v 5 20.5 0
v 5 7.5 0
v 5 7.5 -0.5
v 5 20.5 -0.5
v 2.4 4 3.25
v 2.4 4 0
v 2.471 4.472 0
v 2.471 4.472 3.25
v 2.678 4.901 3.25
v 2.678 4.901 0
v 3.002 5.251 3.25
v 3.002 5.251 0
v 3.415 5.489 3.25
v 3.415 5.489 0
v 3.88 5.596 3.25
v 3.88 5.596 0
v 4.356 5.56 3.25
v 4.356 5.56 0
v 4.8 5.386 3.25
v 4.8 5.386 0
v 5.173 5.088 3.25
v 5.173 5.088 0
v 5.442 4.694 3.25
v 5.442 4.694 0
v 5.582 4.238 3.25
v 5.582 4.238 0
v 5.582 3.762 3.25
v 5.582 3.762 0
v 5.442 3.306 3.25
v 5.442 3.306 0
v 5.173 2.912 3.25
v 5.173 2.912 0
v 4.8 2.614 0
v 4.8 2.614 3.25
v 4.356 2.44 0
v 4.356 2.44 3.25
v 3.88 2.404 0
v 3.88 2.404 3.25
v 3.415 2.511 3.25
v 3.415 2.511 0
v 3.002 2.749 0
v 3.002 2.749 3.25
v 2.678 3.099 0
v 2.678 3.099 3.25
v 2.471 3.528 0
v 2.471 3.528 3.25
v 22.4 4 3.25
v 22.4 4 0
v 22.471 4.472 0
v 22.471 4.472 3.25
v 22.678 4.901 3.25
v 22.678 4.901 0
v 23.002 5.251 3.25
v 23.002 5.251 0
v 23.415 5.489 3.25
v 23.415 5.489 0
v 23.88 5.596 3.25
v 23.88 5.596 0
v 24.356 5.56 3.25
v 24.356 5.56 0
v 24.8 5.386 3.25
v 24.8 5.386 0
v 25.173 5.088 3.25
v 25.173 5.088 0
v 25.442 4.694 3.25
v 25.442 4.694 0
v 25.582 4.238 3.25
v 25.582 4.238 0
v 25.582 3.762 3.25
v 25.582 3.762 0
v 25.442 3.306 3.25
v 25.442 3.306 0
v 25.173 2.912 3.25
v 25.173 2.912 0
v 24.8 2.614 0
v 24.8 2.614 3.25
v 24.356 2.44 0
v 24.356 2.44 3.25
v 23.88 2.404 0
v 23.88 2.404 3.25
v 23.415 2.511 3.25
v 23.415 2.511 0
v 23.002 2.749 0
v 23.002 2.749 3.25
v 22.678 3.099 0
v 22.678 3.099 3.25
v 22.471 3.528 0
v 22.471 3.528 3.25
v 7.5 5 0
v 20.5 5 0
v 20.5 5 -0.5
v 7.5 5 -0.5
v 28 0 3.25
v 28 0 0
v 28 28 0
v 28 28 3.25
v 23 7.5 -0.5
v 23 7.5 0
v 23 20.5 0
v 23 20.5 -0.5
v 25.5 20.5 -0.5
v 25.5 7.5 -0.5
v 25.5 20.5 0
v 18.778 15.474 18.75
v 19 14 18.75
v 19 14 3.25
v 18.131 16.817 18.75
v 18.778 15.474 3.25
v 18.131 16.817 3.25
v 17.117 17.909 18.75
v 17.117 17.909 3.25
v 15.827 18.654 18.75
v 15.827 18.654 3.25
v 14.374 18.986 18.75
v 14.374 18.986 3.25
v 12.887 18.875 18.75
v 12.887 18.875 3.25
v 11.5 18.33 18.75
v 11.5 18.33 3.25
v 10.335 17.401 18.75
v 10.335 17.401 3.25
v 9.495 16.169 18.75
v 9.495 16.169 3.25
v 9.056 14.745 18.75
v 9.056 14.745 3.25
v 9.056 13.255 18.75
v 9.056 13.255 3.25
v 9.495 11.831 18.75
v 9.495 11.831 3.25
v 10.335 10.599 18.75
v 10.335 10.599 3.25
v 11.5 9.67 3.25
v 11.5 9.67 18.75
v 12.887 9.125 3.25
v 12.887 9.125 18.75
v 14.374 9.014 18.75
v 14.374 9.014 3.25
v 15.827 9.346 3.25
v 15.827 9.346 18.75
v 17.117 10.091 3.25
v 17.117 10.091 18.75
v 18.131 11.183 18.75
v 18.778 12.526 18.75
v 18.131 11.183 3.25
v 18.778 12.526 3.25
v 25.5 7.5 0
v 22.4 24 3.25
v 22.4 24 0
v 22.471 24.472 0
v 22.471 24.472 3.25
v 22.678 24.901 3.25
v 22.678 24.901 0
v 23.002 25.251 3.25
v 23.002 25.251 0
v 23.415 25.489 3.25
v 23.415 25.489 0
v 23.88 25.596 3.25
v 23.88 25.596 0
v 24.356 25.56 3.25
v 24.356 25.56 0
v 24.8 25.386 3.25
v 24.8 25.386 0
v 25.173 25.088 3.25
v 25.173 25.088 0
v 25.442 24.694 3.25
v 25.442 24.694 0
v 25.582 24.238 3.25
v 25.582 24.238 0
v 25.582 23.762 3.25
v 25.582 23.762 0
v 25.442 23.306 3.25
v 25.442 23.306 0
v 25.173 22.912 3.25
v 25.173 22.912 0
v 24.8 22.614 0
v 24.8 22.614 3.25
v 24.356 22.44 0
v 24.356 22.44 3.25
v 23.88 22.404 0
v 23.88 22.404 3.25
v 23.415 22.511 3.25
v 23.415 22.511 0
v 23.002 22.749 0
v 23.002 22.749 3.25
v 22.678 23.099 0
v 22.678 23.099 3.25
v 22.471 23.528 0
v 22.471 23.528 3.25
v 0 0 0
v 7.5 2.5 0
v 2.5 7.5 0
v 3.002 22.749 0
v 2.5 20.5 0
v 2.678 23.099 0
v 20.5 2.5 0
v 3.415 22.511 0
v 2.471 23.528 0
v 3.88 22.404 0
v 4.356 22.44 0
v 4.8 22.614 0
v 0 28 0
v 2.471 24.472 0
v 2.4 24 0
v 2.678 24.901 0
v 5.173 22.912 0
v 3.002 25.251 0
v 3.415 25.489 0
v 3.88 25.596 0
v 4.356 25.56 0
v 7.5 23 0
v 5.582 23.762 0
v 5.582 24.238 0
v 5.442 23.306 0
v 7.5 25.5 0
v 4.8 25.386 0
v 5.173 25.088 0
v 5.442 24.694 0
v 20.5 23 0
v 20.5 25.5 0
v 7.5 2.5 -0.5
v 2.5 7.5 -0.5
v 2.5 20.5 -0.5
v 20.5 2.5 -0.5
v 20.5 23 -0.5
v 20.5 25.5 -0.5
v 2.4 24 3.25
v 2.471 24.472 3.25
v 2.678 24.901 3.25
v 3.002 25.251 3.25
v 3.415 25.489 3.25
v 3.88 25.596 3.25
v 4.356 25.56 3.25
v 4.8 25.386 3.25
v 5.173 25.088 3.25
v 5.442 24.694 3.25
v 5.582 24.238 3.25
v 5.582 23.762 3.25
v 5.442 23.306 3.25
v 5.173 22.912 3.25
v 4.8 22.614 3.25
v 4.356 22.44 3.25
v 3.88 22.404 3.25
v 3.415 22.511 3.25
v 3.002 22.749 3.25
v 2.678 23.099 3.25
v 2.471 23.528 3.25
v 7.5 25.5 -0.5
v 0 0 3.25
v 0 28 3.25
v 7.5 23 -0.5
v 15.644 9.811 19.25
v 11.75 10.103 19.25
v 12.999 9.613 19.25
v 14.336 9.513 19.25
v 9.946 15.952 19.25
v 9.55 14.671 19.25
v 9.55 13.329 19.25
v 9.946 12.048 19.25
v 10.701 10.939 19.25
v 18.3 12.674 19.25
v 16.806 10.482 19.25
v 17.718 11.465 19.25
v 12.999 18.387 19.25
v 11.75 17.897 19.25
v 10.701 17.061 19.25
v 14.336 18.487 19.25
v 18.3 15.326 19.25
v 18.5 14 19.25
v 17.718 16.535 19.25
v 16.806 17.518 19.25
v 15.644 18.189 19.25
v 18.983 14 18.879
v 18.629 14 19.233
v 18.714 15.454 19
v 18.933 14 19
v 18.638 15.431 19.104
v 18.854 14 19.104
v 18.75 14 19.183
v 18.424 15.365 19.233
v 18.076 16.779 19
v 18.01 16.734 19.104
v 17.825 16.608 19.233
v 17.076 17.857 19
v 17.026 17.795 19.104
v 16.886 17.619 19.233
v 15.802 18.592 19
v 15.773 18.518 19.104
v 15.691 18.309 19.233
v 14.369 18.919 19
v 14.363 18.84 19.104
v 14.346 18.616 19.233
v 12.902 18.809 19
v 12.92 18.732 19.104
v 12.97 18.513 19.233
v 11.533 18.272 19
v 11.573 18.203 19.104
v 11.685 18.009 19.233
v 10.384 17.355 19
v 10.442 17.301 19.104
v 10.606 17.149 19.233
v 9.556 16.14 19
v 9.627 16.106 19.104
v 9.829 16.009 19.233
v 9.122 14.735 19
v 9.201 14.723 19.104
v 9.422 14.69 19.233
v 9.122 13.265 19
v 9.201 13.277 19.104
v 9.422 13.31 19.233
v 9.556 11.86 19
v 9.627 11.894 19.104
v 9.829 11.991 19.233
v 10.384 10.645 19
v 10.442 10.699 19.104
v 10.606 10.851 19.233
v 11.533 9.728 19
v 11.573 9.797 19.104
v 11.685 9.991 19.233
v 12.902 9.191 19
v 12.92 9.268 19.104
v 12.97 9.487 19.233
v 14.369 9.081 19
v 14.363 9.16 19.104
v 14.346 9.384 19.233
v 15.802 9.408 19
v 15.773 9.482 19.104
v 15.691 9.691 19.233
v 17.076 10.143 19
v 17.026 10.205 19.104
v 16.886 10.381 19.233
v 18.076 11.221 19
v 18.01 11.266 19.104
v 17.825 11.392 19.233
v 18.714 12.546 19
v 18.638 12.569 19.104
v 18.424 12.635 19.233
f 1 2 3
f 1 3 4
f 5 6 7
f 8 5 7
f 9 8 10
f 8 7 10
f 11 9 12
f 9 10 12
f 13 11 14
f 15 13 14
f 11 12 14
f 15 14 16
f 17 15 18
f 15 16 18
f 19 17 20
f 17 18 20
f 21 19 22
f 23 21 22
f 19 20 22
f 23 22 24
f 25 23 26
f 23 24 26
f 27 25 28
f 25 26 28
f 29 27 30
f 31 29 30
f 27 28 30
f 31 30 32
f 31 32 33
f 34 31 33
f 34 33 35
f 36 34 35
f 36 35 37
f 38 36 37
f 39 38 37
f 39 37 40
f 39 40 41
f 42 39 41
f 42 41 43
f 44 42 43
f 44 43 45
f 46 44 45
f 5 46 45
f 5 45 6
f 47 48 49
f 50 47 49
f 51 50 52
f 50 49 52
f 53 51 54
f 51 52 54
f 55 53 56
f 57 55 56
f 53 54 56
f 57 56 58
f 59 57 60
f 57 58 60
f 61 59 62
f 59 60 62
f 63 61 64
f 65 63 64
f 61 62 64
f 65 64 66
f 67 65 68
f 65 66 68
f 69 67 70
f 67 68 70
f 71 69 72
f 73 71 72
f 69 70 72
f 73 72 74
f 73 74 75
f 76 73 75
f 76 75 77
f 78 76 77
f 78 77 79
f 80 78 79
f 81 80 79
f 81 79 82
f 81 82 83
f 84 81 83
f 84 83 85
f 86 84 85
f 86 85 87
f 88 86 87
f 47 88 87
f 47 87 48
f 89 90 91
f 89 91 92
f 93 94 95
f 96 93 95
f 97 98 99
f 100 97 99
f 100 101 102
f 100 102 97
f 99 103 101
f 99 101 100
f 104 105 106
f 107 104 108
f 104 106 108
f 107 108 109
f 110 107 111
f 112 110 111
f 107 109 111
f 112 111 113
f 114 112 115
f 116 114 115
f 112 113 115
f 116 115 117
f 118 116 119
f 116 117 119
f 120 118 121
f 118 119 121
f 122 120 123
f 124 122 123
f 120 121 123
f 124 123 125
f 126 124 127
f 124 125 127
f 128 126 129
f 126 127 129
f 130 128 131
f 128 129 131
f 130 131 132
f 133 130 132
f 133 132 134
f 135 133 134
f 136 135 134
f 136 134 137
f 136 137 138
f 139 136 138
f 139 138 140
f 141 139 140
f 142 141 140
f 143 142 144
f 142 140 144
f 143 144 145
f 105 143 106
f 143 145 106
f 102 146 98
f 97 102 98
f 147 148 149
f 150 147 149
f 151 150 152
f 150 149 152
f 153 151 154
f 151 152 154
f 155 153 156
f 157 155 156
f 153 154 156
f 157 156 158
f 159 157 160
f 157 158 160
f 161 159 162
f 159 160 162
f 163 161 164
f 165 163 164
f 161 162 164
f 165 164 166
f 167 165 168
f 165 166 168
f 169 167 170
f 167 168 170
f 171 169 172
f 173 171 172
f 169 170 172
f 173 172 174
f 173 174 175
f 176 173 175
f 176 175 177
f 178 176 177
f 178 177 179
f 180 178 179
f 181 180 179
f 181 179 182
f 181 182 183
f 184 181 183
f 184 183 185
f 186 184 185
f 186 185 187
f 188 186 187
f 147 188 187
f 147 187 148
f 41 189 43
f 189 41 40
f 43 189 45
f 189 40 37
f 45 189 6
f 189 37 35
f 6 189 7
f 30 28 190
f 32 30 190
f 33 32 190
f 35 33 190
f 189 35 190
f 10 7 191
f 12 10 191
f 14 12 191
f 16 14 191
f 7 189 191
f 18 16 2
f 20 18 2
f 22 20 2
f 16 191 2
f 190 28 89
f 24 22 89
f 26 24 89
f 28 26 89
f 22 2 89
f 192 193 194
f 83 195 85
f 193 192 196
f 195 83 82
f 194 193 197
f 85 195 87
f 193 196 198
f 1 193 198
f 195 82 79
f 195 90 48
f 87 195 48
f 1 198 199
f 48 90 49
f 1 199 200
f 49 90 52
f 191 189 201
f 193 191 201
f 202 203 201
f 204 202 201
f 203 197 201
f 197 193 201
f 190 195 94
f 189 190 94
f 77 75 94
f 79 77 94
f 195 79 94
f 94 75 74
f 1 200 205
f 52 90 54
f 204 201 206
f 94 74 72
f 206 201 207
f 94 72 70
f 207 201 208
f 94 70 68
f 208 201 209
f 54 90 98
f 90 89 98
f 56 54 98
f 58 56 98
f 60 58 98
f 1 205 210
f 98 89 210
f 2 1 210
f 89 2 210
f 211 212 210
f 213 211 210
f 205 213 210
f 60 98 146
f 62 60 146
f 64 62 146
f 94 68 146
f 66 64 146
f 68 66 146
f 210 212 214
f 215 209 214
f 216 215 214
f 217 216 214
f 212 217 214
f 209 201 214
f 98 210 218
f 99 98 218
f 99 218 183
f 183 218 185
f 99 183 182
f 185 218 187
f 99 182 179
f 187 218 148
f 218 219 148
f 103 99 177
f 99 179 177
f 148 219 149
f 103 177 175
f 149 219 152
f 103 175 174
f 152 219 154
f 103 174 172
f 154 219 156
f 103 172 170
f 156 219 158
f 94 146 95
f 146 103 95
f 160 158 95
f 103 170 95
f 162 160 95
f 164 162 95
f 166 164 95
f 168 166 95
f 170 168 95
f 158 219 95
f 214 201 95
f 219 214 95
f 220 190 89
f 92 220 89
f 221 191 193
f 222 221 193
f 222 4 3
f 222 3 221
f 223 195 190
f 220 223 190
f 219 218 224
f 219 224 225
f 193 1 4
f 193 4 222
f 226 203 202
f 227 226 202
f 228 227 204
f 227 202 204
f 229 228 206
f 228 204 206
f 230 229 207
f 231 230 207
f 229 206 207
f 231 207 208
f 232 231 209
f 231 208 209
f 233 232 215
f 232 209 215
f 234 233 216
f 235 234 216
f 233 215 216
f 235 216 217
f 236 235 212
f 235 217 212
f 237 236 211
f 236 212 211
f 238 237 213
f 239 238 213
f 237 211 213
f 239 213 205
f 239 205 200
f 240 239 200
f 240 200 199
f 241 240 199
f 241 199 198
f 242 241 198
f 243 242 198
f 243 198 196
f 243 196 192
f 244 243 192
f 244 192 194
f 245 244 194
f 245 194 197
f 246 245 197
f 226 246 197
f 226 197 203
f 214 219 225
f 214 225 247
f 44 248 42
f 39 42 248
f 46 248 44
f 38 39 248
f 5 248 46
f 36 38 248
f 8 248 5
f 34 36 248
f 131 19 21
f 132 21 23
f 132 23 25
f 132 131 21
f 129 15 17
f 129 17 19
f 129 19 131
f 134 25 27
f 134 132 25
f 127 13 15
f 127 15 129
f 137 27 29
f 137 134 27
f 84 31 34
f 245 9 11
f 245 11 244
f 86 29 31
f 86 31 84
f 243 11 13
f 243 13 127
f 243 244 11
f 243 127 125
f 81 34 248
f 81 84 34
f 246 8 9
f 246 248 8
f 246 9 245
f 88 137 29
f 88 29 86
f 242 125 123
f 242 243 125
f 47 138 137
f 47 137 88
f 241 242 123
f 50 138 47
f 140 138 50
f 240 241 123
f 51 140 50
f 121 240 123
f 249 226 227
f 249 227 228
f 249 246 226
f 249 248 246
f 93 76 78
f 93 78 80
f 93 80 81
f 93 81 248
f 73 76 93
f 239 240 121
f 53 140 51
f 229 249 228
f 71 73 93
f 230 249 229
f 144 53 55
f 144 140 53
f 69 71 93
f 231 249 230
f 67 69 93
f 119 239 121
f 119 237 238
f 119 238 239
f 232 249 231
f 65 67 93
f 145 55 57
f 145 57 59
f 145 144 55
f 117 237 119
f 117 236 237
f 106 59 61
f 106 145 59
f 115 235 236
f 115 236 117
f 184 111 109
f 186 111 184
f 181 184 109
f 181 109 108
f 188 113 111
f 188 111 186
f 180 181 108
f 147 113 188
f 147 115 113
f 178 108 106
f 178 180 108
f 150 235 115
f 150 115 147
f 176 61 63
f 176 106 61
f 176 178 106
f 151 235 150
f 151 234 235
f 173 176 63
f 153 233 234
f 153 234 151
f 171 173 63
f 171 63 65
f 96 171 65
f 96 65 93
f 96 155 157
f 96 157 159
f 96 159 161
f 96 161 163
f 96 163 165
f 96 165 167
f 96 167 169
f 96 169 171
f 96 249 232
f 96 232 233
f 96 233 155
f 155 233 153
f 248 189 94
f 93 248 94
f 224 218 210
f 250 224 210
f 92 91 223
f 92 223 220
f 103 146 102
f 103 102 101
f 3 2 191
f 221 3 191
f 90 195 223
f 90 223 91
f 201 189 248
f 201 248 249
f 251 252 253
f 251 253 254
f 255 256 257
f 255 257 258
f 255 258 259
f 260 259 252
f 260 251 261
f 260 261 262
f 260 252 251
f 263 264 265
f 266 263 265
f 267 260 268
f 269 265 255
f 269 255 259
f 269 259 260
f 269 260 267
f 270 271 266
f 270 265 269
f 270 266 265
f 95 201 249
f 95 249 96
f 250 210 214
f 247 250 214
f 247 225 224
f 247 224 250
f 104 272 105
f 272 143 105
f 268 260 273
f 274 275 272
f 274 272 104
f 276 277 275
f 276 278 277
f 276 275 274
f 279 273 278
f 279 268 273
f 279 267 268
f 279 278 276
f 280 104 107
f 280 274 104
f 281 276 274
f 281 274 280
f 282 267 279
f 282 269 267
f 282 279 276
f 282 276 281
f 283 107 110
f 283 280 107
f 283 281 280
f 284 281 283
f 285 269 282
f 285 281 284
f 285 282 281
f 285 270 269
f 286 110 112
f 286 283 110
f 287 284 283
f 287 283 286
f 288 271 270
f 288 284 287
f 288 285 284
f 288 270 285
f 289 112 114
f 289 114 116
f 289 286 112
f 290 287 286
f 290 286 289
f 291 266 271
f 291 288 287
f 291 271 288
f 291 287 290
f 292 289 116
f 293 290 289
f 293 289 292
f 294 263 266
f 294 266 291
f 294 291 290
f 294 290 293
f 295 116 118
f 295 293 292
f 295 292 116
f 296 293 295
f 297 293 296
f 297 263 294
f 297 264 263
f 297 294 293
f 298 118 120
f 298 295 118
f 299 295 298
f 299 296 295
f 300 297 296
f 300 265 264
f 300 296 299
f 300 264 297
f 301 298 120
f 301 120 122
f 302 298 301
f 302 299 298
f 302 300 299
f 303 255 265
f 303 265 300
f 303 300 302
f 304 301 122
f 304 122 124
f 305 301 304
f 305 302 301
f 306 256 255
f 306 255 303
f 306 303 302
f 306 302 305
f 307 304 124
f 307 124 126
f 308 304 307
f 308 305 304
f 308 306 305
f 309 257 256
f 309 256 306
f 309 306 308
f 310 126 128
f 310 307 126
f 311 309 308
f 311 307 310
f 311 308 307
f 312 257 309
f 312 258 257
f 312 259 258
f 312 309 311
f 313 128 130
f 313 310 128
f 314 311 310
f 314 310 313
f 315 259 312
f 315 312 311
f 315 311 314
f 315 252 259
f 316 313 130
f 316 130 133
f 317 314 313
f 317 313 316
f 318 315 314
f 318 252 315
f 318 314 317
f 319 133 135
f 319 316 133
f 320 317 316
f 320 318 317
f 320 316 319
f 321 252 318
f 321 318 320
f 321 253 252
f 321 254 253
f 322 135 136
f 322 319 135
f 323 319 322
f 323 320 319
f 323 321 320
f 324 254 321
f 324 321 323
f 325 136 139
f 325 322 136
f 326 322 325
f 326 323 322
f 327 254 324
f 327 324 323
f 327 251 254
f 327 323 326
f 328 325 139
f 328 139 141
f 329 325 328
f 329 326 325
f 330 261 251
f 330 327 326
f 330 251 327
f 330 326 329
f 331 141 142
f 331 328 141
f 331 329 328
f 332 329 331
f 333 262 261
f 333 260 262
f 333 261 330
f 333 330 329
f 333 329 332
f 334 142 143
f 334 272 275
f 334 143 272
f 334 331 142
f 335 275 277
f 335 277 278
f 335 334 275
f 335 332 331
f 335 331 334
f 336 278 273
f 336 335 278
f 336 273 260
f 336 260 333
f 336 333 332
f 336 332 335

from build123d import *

# Parameters (mm, degrees)
SKETCH1_W           = 28
SKETCH1_H           = 28
BOSS_EXTRUDE1_DEPTH = 3.25
SKETCH2_R           = 5
BOSS_EXTRUDE2_DEPTH = 16
SKETCH3_R           = 1.6
CUT_EXTRUDE1_DEPTH  = 45.029109689
FILLET1_R           = 0.5
SKETCH4_W           = 13
SKETCH4_H           = 2.5
SKETCH4_W_2         = 2.5
SKETCH4_H_2         = 13
BOSS_EXTRUDE3_DEPTH = 0.5


with BuildPart() as part:
    # Sketch1 → Boss-Extrude1 (new body)
    with BuildSketch(Plane.XY):
        with Locations((14, 14)):
            Rectangle(SKETCH1_W, SKETCH1_H)
    extrude(amount=BOSS_EXTRUDE1_DEPTH)

    # Sketch2 → Boss-Extrude2 (add)
    with BuildSketch(Plane.XY.offset(3.25)):
        with Locations((14, 14)):
            Circle(SKETCH2_R)
    extrude(amount=BOSS_EXTRUDE2_DEPTH)

    # Sketch3 → Cut-Extrude1 (cut, through all)
    with BuildSketch(Plane(origin=(0, 0, 0), x_dir=(-1, 0, 0), z_dir=(0, 0, -1))):
        with Locations((-24, 24)):
            Circle(SKETCH3_R)
        with Locations((-4, 24)):
            Circle(SKETCH3_R)
        with Locations((-4, 4)):
            Circle(SKETCH3_R)
        with Locations((-24, 4)):
            Circle(SKETCH3_R)
    extrude(amount=-CUT_EXTRUDE1_DEPTH, mode=Mode.SUBTRACT)

    # Fillet1
    fillet1_edges = [part.edges().sort_by_distance(p)[0] for p in [
        (9, 14, 19.25),
    ]]
    fillet(fillet1_edges, radius=FILLET1_R)

    # Sketch4 → Boss-Extrude3 (add)
    with BuildSketch(Plane(origin=(0, 0, 0), x_dir=(-1, 0, 0), z_dir=(0, 0, -1))):
        with Locations((-14, 24.25)):
            Rectangle(SKETCH4_W, SKETCH4_H)
        with Locations((-3.75, 14)):
            Rectangle(SKETCH4_W_2, SKETCH4_H_2)
        with Locations((-14, 3.75)):
            Rectangle(SKETCH4_W, SKETCH4_H)
        with Locations((-24.25, 14)):
            Rectangle(SKETCH4_W_2, SKETCH4_H_2)
    extrude(amount=BOSS_EXTRUDE3_DEPTH)


solid = part.part
